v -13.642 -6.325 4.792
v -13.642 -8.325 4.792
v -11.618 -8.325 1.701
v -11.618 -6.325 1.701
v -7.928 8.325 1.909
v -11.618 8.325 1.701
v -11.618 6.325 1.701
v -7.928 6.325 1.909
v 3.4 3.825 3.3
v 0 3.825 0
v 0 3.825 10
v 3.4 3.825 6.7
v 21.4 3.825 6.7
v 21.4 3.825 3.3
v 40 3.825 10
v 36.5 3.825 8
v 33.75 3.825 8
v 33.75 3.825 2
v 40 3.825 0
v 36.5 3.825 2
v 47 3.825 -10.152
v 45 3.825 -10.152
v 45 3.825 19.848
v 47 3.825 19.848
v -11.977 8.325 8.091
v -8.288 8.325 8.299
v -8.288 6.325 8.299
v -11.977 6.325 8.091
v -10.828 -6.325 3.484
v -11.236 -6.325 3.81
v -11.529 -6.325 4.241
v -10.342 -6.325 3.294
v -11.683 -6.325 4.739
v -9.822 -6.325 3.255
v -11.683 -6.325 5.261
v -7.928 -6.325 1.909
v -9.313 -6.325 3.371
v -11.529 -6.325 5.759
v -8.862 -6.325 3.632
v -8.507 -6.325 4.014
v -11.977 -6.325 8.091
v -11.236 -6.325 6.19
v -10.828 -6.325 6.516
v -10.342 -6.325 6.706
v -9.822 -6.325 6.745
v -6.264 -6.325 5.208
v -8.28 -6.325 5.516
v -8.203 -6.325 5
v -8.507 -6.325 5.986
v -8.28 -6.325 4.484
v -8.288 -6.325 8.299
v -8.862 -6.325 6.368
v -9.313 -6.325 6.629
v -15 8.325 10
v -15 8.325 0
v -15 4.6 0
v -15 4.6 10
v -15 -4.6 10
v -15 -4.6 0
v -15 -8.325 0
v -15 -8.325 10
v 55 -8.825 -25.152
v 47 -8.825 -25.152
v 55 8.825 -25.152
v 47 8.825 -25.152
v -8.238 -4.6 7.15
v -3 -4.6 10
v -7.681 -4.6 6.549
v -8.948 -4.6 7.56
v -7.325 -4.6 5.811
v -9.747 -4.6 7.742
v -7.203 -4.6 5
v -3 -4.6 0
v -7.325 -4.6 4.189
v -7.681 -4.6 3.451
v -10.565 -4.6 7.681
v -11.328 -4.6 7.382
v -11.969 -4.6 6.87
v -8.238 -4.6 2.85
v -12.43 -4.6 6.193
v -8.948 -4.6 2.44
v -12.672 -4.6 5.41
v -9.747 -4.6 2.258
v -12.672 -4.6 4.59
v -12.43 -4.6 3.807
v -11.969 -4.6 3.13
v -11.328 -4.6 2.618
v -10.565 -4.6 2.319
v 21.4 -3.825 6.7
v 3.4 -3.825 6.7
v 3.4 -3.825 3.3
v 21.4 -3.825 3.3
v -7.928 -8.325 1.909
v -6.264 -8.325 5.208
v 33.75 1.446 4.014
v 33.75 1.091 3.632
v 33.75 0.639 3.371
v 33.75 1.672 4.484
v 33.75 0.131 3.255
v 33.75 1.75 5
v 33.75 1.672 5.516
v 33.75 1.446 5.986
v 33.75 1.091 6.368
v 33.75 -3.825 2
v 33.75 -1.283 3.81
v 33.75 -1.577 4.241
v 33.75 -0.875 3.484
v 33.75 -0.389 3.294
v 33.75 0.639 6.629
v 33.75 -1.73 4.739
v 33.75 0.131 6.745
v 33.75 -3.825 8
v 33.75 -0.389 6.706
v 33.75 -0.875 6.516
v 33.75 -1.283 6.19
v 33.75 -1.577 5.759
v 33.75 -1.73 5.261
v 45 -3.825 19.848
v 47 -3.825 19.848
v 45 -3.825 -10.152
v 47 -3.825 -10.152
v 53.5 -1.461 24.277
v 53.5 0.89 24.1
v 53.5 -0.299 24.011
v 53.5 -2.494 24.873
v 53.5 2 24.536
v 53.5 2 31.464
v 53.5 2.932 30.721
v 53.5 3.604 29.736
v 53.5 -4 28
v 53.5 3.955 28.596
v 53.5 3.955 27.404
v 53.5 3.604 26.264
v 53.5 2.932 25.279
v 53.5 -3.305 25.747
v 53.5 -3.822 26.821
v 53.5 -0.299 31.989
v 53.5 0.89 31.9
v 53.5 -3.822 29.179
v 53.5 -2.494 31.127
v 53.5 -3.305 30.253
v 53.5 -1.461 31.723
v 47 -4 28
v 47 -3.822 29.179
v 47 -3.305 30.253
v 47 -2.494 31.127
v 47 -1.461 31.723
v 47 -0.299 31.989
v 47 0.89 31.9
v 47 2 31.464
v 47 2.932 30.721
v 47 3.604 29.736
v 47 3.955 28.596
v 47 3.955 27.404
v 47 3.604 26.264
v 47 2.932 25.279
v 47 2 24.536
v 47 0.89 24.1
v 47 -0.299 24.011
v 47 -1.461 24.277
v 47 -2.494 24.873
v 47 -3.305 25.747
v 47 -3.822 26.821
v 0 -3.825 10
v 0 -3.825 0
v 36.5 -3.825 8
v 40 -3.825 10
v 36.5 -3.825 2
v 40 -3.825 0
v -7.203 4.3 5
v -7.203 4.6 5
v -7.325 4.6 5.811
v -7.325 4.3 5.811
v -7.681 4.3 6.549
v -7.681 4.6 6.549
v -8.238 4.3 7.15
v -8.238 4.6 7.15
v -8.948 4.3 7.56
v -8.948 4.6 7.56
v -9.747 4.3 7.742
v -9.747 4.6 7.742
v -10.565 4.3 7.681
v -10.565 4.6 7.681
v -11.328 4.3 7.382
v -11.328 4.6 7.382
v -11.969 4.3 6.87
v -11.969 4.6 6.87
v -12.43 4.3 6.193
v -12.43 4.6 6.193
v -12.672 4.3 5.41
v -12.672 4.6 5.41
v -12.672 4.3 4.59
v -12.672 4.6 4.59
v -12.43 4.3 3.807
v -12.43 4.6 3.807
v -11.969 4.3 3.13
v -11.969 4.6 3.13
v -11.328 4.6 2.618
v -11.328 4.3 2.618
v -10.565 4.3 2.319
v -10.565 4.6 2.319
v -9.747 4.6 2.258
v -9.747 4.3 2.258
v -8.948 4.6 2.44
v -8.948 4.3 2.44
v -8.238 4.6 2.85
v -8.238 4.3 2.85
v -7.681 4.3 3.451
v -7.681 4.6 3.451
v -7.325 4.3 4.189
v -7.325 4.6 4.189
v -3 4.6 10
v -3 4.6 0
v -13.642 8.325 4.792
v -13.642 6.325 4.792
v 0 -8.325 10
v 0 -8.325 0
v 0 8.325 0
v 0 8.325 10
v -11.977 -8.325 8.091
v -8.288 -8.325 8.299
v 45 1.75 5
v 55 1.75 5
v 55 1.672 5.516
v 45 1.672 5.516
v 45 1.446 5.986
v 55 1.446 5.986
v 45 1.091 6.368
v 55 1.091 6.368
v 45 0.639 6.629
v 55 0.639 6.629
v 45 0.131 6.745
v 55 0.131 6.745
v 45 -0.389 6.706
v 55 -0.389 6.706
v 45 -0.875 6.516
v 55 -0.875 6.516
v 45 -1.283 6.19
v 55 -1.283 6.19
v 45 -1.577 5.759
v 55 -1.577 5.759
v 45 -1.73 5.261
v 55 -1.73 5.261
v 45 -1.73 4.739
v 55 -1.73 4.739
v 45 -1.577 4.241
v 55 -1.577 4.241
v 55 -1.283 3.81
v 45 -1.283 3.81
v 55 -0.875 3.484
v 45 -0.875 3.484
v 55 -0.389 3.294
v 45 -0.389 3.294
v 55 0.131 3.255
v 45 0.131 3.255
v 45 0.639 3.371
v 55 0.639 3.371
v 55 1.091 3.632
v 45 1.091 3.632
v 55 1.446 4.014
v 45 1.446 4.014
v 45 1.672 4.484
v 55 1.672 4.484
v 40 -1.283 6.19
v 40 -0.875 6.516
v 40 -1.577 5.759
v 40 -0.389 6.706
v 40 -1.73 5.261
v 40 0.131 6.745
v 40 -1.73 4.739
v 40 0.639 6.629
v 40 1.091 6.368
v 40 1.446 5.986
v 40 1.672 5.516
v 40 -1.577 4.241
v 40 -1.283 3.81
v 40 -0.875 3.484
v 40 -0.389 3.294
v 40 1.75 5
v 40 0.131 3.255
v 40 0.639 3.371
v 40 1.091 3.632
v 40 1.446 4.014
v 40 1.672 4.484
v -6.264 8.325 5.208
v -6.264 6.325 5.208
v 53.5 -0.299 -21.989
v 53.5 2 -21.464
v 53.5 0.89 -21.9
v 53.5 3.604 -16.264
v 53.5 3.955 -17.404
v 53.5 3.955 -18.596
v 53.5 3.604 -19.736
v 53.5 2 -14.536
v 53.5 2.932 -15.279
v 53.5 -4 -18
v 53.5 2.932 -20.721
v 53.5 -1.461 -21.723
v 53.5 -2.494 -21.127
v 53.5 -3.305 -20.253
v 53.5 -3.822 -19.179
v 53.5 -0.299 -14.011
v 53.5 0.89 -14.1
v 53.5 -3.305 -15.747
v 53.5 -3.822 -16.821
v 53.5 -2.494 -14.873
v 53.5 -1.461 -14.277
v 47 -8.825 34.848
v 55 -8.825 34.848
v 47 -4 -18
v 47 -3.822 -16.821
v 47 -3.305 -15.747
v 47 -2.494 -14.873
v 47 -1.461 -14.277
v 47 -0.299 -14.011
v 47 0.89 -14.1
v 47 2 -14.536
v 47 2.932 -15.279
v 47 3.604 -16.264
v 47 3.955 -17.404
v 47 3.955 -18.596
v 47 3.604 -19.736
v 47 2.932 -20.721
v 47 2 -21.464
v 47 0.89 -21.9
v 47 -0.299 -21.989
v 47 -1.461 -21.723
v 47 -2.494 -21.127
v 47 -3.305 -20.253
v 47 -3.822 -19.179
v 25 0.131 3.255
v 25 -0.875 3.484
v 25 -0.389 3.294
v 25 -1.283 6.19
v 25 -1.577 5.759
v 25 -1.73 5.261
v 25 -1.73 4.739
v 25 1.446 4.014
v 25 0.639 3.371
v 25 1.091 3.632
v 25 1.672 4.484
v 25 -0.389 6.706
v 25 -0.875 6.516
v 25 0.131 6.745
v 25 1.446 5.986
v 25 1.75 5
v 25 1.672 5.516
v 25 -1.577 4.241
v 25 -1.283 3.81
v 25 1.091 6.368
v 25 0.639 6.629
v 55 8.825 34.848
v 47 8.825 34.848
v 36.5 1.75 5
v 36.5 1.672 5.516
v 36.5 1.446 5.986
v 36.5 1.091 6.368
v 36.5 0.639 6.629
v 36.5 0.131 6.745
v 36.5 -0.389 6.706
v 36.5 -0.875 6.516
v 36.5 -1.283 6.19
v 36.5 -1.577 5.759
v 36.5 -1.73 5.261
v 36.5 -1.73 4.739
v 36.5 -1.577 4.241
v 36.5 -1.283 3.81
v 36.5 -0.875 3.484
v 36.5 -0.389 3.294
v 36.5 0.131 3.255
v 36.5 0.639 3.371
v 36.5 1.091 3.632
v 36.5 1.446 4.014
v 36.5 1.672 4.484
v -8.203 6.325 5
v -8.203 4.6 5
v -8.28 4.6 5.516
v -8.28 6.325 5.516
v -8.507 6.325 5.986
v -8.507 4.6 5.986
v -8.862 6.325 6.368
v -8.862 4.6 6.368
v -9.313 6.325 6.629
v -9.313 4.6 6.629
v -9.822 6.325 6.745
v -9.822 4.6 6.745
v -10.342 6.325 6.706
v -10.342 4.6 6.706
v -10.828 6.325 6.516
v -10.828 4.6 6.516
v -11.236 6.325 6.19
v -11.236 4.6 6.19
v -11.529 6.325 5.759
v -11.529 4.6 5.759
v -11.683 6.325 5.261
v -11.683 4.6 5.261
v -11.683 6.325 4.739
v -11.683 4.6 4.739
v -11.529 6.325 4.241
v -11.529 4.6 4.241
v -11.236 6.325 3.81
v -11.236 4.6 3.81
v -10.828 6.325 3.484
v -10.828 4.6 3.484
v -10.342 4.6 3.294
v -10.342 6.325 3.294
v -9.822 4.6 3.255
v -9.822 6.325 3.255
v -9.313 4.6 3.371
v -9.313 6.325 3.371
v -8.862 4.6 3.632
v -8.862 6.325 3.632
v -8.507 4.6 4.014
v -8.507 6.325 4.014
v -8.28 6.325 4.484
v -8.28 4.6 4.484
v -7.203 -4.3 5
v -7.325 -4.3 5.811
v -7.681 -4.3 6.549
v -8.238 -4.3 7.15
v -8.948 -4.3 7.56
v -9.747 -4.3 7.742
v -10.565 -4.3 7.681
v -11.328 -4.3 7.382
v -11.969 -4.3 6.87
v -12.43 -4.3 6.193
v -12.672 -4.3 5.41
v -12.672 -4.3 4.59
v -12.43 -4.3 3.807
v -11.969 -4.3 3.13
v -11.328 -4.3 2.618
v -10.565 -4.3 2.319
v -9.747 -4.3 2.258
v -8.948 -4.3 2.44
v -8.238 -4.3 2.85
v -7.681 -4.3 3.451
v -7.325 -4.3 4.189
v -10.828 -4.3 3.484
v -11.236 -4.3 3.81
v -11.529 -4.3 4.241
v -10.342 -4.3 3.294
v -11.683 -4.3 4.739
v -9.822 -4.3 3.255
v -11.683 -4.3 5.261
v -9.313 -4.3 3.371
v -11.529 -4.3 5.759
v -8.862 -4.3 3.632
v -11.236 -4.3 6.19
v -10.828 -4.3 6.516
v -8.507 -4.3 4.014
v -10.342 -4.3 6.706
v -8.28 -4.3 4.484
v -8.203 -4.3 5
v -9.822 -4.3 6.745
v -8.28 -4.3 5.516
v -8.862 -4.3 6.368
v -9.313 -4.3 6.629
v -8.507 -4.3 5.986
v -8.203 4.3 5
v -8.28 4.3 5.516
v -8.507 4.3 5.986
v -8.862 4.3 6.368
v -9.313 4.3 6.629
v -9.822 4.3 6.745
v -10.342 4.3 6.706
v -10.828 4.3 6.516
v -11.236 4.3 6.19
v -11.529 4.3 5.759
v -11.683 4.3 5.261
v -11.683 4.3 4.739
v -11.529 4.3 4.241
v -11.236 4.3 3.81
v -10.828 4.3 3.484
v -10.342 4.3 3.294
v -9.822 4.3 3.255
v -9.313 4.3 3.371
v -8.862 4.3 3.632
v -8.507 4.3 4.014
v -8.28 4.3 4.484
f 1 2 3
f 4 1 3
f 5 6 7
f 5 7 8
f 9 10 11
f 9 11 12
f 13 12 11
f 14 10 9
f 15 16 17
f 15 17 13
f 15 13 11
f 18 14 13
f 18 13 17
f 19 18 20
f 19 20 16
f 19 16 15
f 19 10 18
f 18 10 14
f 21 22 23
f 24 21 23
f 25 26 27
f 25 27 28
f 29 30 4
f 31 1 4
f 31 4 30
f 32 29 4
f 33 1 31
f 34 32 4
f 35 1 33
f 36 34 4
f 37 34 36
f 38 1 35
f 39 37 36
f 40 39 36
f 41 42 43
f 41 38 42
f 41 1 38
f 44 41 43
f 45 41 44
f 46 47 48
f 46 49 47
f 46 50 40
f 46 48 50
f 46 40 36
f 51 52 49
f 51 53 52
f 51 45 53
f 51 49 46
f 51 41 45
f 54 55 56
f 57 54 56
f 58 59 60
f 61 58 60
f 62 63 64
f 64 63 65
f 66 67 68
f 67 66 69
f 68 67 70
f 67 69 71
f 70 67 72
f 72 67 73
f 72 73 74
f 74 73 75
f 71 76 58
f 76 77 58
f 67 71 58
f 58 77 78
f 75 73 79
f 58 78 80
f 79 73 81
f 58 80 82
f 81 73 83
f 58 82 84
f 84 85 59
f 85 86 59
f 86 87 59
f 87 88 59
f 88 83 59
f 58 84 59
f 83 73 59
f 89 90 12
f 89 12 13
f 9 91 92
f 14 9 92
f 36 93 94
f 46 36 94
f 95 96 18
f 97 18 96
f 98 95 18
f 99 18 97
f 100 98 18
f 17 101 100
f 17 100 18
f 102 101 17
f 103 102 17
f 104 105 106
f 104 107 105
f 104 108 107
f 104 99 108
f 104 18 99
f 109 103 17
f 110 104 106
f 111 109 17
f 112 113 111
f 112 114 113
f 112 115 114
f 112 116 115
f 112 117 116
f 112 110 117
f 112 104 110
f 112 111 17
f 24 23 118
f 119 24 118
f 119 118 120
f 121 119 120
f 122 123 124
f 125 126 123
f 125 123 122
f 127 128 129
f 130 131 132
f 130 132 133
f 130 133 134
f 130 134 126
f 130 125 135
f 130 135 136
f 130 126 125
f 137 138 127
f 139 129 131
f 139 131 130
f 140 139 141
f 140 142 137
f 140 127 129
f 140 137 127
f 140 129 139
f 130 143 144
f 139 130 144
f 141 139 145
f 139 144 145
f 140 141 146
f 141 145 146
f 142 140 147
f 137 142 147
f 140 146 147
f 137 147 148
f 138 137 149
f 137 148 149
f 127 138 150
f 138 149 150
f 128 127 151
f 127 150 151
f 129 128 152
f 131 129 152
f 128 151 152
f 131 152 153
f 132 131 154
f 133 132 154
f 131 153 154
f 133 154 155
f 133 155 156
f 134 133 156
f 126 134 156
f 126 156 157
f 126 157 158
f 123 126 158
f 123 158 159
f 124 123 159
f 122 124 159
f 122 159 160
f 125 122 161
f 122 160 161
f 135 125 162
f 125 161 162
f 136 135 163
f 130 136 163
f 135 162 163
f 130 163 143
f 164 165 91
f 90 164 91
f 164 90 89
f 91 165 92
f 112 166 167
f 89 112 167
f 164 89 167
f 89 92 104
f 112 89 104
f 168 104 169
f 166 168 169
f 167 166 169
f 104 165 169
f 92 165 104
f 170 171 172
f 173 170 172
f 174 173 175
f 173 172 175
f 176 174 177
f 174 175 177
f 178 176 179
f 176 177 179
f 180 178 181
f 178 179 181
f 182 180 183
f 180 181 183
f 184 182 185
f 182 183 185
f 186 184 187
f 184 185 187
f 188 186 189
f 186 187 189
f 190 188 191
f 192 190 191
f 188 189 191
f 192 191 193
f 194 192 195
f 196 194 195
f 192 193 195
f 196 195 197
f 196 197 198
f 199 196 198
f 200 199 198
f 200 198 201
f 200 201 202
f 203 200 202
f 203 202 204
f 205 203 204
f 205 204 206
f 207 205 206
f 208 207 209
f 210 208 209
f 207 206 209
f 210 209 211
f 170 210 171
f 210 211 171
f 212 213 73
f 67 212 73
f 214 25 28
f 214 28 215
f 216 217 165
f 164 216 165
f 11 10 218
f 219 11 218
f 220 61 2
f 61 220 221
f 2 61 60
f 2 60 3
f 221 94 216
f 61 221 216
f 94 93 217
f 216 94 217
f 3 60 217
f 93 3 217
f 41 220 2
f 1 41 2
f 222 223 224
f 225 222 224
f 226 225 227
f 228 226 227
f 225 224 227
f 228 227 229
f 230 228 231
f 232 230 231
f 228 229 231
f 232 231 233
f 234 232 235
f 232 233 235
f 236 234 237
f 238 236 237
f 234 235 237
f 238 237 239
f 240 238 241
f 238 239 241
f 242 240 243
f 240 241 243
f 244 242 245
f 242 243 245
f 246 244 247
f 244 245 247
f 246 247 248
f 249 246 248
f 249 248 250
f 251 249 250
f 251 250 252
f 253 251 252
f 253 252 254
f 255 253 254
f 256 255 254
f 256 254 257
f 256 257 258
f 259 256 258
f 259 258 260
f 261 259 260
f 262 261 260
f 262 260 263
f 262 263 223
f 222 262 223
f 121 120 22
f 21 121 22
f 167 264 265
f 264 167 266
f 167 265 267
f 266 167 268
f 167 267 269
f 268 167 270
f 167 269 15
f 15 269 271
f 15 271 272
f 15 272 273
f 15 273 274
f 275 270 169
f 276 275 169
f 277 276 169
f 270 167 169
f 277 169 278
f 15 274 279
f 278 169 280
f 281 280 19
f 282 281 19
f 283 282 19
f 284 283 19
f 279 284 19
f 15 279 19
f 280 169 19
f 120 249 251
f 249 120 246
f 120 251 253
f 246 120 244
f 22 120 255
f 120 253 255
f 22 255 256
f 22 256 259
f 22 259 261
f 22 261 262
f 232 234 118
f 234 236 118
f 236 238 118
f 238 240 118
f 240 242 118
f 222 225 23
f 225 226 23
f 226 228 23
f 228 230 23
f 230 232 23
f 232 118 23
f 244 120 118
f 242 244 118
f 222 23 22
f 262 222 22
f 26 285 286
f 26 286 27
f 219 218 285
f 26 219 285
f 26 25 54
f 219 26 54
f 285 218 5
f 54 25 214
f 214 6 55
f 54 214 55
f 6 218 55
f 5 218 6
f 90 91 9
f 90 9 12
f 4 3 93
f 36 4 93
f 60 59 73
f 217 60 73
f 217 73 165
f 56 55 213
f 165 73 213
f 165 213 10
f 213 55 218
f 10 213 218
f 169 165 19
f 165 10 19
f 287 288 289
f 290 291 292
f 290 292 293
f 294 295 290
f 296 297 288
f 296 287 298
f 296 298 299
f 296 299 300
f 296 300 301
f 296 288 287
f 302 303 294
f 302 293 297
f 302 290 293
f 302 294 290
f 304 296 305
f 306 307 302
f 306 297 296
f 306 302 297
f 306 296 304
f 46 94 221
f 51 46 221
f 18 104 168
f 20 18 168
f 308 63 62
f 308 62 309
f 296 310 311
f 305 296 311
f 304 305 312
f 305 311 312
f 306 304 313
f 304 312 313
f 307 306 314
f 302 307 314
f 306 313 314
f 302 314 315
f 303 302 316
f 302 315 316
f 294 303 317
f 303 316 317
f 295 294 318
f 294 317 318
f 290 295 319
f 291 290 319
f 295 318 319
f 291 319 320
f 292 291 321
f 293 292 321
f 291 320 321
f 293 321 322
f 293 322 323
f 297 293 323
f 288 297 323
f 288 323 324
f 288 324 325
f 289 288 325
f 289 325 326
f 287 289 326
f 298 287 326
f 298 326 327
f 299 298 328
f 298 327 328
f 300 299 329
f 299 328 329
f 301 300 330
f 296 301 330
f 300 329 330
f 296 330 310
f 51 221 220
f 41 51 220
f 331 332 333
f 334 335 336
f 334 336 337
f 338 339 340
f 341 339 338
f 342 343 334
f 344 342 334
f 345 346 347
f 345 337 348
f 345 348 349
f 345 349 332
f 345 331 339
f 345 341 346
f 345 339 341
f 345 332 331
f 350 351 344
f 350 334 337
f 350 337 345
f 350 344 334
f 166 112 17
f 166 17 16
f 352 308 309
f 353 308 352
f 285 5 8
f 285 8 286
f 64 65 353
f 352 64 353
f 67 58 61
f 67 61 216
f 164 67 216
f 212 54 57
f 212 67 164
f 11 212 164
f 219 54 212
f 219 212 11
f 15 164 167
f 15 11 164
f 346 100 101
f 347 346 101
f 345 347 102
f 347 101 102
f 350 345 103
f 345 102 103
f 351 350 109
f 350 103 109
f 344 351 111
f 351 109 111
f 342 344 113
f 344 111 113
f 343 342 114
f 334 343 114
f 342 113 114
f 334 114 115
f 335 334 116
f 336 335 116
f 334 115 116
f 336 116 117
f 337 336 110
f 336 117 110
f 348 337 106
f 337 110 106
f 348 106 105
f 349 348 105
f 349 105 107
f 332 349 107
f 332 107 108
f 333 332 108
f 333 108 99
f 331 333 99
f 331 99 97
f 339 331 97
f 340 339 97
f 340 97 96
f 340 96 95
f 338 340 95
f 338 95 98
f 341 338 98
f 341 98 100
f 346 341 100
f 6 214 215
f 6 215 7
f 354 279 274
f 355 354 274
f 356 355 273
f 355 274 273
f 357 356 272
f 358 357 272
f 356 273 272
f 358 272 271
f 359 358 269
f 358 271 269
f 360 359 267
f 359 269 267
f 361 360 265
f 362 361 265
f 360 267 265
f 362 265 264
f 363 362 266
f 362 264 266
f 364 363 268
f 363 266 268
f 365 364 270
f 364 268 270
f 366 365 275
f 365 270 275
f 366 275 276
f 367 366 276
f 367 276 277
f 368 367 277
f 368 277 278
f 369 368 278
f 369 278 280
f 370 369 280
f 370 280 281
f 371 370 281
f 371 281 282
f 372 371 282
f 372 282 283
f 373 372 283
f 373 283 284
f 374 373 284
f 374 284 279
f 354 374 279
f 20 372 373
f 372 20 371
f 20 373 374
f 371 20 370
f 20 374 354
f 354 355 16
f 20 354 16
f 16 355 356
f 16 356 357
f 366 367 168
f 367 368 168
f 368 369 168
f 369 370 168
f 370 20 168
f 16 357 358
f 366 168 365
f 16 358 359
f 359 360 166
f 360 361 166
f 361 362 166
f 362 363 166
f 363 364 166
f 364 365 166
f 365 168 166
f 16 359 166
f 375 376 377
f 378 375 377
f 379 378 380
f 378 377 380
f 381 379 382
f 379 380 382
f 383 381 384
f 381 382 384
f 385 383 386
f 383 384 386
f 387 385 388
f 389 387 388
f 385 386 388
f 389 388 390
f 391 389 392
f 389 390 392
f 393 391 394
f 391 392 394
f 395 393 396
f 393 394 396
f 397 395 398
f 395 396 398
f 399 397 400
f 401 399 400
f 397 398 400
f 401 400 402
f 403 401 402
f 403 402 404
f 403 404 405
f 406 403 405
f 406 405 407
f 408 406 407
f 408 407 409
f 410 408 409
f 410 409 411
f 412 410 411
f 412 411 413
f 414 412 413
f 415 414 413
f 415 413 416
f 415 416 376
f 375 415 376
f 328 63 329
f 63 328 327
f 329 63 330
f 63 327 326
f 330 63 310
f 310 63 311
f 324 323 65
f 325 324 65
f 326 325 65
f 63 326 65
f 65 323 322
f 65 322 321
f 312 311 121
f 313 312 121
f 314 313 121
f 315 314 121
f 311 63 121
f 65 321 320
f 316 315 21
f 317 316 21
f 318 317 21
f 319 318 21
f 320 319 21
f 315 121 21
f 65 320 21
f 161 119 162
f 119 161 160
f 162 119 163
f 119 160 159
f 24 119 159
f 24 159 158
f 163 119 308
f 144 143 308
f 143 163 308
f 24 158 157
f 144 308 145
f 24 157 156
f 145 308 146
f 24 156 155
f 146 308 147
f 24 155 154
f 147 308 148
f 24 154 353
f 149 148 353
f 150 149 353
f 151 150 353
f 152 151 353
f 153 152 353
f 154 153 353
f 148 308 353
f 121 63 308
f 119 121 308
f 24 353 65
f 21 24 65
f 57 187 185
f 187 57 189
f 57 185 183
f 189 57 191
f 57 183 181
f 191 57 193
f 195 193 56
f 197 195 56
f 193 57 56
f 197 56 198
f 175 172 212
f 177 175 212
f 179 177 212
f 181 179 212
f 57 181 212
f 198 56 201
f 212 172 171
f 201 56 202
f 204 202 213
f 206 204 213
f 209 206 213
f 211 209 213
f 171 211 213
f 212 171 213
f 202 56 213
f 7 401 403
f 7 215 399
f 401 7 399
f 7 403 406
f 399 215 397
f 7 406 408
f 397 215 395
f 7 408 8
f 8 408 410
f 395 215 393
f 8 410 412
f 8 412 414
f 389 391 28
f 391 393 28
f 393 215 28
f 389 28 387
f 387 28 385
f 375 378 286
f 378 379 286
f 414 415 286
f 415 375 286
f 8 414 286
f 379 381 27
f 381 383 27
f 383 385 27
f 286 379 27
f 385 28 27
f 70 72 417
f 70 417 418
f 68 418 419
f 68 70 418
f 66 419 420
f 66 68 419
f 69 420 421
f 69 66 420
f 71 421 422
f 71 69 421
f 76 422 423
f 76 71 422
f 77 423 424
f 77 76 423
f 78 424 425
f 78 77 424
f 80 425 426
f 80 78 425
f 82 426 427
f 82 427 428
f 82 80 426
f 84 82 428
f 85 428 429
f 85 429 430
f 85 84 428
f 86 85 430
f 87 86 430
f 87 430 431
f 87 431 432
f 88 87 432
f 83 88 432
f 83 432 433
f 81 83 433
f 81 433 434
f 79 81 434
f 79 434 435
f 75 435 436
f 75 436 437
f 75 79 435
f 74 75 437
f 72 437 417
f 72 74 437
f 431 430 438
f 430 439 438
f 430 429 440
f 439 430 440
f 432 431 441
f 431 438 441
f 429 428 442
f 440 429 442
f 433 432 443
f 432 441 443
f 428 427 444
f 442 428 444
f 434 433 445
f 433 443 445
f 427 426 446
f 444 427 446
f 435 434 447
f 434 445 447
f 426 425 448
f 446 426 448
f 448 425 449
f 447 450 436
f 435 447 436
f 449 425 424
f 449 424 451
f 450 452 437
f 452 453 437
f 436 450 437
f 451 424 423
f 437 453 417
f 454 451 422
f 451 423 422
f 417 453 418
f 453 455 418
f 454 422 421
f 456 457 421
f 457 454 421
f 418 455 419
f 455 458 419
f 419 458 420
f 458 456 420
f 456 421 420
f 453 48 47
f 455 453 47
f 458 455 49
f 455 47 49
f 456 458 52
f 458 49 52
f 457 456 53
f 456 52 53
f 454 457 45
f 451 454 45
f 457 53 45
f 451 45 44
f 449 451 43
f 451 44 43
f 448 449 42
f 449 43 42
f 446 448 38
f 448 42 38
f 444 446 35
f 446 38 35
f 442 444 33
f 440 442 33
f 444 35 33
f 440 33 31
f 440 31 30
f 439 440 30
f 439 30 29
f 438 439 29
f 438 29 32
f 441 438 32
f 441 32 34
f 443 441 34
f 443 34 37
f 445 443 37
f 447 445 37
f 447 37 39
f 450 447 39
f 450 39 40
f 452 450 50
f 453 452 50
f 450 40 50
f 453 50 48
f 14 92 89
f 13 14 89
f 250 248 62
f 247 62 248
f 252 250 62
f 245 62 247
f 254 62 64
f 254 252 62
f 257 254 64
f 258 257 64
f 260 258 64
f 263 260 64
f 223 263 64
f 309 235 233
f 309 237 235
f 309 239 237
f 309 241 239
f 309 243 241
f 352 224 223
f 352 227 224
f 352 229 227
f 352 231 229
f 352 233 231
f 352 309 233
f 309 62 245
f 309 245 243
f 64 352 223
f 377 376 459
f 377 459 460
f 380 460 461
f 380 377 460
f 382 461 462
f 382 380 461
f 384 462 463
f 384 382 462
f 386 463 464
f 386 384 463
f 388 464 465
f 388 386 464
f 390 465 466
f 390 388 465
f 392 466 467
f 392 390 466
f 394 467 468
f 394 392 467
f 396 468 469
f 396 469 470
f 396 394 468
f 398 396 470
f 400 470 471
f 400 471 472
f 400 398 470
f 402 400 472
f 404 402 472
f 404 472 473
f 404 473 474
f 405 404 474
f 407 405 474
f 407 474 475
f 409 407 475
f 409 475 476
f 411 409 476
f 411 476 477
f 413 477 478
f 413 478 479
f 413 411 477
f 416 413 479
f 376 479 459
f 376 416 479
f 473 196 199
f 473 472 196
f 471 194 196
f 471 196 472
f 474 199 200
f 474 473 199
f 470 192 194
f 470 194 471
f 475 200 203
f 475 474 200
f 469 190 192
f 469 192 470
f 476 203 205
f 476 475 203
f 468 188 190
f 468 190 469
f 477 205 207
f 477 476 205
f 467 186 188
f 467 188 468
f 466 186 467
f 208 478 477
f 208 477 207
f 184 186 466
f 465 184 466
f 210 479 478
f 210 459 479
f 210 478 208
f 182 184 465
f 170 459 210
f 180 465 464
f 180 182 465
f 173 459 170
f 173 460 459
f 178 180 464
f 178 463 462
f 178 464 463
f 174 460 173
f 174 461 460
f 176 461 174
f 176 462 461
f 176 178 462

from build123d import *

# Parameters (mm, degrees)
F0_W      = 40
F0_H      = 3.825
F1_DEPTH  = 10
F2_R      = 1.75
F3_DEPTH  = 16.651
F4_W      = 18
F4_H      = 3.4
F4_W_2    = 2.75
F4_H_2    = 6
F5_DEPTH  = 12.151
F6_R      = 1.75
F7_DEPTH  = 15
F10_DEPTH = 2
F11_W     = 17.65
F11_H     = 60
F12_DEPTH = 8
F13_R     = 1.75
F14_DEPTH = 70.001
F15_R     = 2.75
F15_R_2   = 1.75
F16_DEPTH = 0.3
F17_R     = 1.75
F18_DEPTH = 2
F19_R     = 4
F20_DEPTH = 6.5


# Not quite as in the source:
# - a pattern or mirror of a feature is missing from the dataset's text; its kind, count and spacing are read off the source's solid


with BuildPart() as f1:
    # F0 (on Top) → F1 (new body)
    with BuildSketch(Plane.XY):
        Polygon((0, -3.825), (0, 0), (-3, 0), (-3, -4.6), (-15, -4.6), (-15, -8.325), (0, -8.325), align=None)
        Polygon((-3, 0), (0, 0), (0, 3.825), (0, 8.325), (-15, 8.325), (-15, 4.6), (-3, 4.6), align=None)
        with Locations((20, 1.9125)):
            Rectangle(F0_W, F0_H)
        with Locations((20, -1.9125)):
            Rectangle(F0_W, F0_H)
    extrude(amount=F1_DEPTH)

    # F2 (on face) → F3 (cut, through all)
    with BuildSketch(Plane.XZ.offset(8.325)):
        with Locations((-9.9527407438, 5)):
            Circle(F2_R)
    extrude(amount=-F3_DEPTH, mode=Mode.SUBTRACT)

    # F4 (on face) → F5 (cut, through all)
    with BuildSketch(Plane.XZ.offset(3.825)):
        with Locations((12.4002694301, 5)):
            Rectangle(F4_W, F4_H)
        with Locations((35.125, 5)):
            Rectangle(F4_W_2, F4_H_2)
    extrude(amount=-F5_DEPTH, mode=Mode.SUBTRACT)

    # F6 (on face) → F7 (cut)
    with BuildSketch(Plane.YZ.offset(40)):
        with Locations((0, 5)):
            Circle(F6_R)
    extrude(amount=-F7_DEPTH, mode=Mode.SUBTRACT)

    # F15 (on face) → F16 (join)
    with BuildSketch(Plane.XZ.offset(-4.6)):
        with Locations((-9.9527407438, 5)):
            Circle(F15_R)
        with Locations((-9.9527407438, 5)):
            Circle(F15_R_2, mode=Mode.SUBTRACT)
    f16 = extrude(amount=F16_DEPTH)

    # F16_copies: F16 across plane
    add(f16.mirror(Plane(origin=(0, 0, 0), x_dir=(0, 0, -1), z_dir=(0, -1, 0))))

    # F17 (on face) → F18 (cut)
    with BuildSketch(Plane.XZ.offset(8.325)):
        Polygon((-7.9284293953, 1.9088033227), (-6.2635302189, 5.2075067143), (-8.2878415673, 8.2987033916), (-11.9770520922, 8.0911966773), (-13.6419512686, 4.7924932857), (-11.6176399202, 1.7012966084), align=None)
        with Locations((-9.9527407438, 5)):
            Circle(F17_R, mode=Mode.SUBTRACT)
    f18 = extrude(amount=-F18_DEPTH, mode=Mode.SUBTRACT)

    # F18_copies: F18 across plane
    add(f18.mirror(Plane.ZX), mode=Mode.SUBTRACT)


with BuildPart() as f10:
    # F9 (on offset) → F10 (new body)
    with BuildSketch(Plane.YZ.offset(45)):
        Polygon((3.825, 0), (3.825, 10), (3.825, 19.8484882712), (-3.825, 19.8484882712), (-3.825, 10), (-3.825, 0), (-3.825, -10.1515117288), (3.825, -10.1515117288), align=None)
    extrude(amount=F10_DEPTH)

    # F11 (on face) → F12 (join)
    with BuildSketch(Plane.YZ.offset(47)):
        with Locations((0, 4.8484882712)):
            Rectangle(F11_W, F11_H)
    extrude(amount=F12_DEPTH)

    # F13 (on face) → F14 (cut, through all)
    with BuildSketch(Plane.YZ.offset(55)):
        with Locations((0, 5)):
            Circle(F13_R)
    extrude(amount=-F14_DEPTH, mode=Mode.SUBTRACT)

    # F19 (on face) → F20 (cut)
    with BuildSketch(Plane(origin=(47, 0, 0), x_dir=(0, -1, 0), z_dir=(-1, 0, 0))):
        with Locations((0, 28)):
            Circle(F19_R)
        with Locations((0, -18)):
            Circle(F19_R)
    extrude(amount=-F20_DEPTH, mode=Mode.SUBTRACT)


solid = Compound([f1.part, f10.part])
